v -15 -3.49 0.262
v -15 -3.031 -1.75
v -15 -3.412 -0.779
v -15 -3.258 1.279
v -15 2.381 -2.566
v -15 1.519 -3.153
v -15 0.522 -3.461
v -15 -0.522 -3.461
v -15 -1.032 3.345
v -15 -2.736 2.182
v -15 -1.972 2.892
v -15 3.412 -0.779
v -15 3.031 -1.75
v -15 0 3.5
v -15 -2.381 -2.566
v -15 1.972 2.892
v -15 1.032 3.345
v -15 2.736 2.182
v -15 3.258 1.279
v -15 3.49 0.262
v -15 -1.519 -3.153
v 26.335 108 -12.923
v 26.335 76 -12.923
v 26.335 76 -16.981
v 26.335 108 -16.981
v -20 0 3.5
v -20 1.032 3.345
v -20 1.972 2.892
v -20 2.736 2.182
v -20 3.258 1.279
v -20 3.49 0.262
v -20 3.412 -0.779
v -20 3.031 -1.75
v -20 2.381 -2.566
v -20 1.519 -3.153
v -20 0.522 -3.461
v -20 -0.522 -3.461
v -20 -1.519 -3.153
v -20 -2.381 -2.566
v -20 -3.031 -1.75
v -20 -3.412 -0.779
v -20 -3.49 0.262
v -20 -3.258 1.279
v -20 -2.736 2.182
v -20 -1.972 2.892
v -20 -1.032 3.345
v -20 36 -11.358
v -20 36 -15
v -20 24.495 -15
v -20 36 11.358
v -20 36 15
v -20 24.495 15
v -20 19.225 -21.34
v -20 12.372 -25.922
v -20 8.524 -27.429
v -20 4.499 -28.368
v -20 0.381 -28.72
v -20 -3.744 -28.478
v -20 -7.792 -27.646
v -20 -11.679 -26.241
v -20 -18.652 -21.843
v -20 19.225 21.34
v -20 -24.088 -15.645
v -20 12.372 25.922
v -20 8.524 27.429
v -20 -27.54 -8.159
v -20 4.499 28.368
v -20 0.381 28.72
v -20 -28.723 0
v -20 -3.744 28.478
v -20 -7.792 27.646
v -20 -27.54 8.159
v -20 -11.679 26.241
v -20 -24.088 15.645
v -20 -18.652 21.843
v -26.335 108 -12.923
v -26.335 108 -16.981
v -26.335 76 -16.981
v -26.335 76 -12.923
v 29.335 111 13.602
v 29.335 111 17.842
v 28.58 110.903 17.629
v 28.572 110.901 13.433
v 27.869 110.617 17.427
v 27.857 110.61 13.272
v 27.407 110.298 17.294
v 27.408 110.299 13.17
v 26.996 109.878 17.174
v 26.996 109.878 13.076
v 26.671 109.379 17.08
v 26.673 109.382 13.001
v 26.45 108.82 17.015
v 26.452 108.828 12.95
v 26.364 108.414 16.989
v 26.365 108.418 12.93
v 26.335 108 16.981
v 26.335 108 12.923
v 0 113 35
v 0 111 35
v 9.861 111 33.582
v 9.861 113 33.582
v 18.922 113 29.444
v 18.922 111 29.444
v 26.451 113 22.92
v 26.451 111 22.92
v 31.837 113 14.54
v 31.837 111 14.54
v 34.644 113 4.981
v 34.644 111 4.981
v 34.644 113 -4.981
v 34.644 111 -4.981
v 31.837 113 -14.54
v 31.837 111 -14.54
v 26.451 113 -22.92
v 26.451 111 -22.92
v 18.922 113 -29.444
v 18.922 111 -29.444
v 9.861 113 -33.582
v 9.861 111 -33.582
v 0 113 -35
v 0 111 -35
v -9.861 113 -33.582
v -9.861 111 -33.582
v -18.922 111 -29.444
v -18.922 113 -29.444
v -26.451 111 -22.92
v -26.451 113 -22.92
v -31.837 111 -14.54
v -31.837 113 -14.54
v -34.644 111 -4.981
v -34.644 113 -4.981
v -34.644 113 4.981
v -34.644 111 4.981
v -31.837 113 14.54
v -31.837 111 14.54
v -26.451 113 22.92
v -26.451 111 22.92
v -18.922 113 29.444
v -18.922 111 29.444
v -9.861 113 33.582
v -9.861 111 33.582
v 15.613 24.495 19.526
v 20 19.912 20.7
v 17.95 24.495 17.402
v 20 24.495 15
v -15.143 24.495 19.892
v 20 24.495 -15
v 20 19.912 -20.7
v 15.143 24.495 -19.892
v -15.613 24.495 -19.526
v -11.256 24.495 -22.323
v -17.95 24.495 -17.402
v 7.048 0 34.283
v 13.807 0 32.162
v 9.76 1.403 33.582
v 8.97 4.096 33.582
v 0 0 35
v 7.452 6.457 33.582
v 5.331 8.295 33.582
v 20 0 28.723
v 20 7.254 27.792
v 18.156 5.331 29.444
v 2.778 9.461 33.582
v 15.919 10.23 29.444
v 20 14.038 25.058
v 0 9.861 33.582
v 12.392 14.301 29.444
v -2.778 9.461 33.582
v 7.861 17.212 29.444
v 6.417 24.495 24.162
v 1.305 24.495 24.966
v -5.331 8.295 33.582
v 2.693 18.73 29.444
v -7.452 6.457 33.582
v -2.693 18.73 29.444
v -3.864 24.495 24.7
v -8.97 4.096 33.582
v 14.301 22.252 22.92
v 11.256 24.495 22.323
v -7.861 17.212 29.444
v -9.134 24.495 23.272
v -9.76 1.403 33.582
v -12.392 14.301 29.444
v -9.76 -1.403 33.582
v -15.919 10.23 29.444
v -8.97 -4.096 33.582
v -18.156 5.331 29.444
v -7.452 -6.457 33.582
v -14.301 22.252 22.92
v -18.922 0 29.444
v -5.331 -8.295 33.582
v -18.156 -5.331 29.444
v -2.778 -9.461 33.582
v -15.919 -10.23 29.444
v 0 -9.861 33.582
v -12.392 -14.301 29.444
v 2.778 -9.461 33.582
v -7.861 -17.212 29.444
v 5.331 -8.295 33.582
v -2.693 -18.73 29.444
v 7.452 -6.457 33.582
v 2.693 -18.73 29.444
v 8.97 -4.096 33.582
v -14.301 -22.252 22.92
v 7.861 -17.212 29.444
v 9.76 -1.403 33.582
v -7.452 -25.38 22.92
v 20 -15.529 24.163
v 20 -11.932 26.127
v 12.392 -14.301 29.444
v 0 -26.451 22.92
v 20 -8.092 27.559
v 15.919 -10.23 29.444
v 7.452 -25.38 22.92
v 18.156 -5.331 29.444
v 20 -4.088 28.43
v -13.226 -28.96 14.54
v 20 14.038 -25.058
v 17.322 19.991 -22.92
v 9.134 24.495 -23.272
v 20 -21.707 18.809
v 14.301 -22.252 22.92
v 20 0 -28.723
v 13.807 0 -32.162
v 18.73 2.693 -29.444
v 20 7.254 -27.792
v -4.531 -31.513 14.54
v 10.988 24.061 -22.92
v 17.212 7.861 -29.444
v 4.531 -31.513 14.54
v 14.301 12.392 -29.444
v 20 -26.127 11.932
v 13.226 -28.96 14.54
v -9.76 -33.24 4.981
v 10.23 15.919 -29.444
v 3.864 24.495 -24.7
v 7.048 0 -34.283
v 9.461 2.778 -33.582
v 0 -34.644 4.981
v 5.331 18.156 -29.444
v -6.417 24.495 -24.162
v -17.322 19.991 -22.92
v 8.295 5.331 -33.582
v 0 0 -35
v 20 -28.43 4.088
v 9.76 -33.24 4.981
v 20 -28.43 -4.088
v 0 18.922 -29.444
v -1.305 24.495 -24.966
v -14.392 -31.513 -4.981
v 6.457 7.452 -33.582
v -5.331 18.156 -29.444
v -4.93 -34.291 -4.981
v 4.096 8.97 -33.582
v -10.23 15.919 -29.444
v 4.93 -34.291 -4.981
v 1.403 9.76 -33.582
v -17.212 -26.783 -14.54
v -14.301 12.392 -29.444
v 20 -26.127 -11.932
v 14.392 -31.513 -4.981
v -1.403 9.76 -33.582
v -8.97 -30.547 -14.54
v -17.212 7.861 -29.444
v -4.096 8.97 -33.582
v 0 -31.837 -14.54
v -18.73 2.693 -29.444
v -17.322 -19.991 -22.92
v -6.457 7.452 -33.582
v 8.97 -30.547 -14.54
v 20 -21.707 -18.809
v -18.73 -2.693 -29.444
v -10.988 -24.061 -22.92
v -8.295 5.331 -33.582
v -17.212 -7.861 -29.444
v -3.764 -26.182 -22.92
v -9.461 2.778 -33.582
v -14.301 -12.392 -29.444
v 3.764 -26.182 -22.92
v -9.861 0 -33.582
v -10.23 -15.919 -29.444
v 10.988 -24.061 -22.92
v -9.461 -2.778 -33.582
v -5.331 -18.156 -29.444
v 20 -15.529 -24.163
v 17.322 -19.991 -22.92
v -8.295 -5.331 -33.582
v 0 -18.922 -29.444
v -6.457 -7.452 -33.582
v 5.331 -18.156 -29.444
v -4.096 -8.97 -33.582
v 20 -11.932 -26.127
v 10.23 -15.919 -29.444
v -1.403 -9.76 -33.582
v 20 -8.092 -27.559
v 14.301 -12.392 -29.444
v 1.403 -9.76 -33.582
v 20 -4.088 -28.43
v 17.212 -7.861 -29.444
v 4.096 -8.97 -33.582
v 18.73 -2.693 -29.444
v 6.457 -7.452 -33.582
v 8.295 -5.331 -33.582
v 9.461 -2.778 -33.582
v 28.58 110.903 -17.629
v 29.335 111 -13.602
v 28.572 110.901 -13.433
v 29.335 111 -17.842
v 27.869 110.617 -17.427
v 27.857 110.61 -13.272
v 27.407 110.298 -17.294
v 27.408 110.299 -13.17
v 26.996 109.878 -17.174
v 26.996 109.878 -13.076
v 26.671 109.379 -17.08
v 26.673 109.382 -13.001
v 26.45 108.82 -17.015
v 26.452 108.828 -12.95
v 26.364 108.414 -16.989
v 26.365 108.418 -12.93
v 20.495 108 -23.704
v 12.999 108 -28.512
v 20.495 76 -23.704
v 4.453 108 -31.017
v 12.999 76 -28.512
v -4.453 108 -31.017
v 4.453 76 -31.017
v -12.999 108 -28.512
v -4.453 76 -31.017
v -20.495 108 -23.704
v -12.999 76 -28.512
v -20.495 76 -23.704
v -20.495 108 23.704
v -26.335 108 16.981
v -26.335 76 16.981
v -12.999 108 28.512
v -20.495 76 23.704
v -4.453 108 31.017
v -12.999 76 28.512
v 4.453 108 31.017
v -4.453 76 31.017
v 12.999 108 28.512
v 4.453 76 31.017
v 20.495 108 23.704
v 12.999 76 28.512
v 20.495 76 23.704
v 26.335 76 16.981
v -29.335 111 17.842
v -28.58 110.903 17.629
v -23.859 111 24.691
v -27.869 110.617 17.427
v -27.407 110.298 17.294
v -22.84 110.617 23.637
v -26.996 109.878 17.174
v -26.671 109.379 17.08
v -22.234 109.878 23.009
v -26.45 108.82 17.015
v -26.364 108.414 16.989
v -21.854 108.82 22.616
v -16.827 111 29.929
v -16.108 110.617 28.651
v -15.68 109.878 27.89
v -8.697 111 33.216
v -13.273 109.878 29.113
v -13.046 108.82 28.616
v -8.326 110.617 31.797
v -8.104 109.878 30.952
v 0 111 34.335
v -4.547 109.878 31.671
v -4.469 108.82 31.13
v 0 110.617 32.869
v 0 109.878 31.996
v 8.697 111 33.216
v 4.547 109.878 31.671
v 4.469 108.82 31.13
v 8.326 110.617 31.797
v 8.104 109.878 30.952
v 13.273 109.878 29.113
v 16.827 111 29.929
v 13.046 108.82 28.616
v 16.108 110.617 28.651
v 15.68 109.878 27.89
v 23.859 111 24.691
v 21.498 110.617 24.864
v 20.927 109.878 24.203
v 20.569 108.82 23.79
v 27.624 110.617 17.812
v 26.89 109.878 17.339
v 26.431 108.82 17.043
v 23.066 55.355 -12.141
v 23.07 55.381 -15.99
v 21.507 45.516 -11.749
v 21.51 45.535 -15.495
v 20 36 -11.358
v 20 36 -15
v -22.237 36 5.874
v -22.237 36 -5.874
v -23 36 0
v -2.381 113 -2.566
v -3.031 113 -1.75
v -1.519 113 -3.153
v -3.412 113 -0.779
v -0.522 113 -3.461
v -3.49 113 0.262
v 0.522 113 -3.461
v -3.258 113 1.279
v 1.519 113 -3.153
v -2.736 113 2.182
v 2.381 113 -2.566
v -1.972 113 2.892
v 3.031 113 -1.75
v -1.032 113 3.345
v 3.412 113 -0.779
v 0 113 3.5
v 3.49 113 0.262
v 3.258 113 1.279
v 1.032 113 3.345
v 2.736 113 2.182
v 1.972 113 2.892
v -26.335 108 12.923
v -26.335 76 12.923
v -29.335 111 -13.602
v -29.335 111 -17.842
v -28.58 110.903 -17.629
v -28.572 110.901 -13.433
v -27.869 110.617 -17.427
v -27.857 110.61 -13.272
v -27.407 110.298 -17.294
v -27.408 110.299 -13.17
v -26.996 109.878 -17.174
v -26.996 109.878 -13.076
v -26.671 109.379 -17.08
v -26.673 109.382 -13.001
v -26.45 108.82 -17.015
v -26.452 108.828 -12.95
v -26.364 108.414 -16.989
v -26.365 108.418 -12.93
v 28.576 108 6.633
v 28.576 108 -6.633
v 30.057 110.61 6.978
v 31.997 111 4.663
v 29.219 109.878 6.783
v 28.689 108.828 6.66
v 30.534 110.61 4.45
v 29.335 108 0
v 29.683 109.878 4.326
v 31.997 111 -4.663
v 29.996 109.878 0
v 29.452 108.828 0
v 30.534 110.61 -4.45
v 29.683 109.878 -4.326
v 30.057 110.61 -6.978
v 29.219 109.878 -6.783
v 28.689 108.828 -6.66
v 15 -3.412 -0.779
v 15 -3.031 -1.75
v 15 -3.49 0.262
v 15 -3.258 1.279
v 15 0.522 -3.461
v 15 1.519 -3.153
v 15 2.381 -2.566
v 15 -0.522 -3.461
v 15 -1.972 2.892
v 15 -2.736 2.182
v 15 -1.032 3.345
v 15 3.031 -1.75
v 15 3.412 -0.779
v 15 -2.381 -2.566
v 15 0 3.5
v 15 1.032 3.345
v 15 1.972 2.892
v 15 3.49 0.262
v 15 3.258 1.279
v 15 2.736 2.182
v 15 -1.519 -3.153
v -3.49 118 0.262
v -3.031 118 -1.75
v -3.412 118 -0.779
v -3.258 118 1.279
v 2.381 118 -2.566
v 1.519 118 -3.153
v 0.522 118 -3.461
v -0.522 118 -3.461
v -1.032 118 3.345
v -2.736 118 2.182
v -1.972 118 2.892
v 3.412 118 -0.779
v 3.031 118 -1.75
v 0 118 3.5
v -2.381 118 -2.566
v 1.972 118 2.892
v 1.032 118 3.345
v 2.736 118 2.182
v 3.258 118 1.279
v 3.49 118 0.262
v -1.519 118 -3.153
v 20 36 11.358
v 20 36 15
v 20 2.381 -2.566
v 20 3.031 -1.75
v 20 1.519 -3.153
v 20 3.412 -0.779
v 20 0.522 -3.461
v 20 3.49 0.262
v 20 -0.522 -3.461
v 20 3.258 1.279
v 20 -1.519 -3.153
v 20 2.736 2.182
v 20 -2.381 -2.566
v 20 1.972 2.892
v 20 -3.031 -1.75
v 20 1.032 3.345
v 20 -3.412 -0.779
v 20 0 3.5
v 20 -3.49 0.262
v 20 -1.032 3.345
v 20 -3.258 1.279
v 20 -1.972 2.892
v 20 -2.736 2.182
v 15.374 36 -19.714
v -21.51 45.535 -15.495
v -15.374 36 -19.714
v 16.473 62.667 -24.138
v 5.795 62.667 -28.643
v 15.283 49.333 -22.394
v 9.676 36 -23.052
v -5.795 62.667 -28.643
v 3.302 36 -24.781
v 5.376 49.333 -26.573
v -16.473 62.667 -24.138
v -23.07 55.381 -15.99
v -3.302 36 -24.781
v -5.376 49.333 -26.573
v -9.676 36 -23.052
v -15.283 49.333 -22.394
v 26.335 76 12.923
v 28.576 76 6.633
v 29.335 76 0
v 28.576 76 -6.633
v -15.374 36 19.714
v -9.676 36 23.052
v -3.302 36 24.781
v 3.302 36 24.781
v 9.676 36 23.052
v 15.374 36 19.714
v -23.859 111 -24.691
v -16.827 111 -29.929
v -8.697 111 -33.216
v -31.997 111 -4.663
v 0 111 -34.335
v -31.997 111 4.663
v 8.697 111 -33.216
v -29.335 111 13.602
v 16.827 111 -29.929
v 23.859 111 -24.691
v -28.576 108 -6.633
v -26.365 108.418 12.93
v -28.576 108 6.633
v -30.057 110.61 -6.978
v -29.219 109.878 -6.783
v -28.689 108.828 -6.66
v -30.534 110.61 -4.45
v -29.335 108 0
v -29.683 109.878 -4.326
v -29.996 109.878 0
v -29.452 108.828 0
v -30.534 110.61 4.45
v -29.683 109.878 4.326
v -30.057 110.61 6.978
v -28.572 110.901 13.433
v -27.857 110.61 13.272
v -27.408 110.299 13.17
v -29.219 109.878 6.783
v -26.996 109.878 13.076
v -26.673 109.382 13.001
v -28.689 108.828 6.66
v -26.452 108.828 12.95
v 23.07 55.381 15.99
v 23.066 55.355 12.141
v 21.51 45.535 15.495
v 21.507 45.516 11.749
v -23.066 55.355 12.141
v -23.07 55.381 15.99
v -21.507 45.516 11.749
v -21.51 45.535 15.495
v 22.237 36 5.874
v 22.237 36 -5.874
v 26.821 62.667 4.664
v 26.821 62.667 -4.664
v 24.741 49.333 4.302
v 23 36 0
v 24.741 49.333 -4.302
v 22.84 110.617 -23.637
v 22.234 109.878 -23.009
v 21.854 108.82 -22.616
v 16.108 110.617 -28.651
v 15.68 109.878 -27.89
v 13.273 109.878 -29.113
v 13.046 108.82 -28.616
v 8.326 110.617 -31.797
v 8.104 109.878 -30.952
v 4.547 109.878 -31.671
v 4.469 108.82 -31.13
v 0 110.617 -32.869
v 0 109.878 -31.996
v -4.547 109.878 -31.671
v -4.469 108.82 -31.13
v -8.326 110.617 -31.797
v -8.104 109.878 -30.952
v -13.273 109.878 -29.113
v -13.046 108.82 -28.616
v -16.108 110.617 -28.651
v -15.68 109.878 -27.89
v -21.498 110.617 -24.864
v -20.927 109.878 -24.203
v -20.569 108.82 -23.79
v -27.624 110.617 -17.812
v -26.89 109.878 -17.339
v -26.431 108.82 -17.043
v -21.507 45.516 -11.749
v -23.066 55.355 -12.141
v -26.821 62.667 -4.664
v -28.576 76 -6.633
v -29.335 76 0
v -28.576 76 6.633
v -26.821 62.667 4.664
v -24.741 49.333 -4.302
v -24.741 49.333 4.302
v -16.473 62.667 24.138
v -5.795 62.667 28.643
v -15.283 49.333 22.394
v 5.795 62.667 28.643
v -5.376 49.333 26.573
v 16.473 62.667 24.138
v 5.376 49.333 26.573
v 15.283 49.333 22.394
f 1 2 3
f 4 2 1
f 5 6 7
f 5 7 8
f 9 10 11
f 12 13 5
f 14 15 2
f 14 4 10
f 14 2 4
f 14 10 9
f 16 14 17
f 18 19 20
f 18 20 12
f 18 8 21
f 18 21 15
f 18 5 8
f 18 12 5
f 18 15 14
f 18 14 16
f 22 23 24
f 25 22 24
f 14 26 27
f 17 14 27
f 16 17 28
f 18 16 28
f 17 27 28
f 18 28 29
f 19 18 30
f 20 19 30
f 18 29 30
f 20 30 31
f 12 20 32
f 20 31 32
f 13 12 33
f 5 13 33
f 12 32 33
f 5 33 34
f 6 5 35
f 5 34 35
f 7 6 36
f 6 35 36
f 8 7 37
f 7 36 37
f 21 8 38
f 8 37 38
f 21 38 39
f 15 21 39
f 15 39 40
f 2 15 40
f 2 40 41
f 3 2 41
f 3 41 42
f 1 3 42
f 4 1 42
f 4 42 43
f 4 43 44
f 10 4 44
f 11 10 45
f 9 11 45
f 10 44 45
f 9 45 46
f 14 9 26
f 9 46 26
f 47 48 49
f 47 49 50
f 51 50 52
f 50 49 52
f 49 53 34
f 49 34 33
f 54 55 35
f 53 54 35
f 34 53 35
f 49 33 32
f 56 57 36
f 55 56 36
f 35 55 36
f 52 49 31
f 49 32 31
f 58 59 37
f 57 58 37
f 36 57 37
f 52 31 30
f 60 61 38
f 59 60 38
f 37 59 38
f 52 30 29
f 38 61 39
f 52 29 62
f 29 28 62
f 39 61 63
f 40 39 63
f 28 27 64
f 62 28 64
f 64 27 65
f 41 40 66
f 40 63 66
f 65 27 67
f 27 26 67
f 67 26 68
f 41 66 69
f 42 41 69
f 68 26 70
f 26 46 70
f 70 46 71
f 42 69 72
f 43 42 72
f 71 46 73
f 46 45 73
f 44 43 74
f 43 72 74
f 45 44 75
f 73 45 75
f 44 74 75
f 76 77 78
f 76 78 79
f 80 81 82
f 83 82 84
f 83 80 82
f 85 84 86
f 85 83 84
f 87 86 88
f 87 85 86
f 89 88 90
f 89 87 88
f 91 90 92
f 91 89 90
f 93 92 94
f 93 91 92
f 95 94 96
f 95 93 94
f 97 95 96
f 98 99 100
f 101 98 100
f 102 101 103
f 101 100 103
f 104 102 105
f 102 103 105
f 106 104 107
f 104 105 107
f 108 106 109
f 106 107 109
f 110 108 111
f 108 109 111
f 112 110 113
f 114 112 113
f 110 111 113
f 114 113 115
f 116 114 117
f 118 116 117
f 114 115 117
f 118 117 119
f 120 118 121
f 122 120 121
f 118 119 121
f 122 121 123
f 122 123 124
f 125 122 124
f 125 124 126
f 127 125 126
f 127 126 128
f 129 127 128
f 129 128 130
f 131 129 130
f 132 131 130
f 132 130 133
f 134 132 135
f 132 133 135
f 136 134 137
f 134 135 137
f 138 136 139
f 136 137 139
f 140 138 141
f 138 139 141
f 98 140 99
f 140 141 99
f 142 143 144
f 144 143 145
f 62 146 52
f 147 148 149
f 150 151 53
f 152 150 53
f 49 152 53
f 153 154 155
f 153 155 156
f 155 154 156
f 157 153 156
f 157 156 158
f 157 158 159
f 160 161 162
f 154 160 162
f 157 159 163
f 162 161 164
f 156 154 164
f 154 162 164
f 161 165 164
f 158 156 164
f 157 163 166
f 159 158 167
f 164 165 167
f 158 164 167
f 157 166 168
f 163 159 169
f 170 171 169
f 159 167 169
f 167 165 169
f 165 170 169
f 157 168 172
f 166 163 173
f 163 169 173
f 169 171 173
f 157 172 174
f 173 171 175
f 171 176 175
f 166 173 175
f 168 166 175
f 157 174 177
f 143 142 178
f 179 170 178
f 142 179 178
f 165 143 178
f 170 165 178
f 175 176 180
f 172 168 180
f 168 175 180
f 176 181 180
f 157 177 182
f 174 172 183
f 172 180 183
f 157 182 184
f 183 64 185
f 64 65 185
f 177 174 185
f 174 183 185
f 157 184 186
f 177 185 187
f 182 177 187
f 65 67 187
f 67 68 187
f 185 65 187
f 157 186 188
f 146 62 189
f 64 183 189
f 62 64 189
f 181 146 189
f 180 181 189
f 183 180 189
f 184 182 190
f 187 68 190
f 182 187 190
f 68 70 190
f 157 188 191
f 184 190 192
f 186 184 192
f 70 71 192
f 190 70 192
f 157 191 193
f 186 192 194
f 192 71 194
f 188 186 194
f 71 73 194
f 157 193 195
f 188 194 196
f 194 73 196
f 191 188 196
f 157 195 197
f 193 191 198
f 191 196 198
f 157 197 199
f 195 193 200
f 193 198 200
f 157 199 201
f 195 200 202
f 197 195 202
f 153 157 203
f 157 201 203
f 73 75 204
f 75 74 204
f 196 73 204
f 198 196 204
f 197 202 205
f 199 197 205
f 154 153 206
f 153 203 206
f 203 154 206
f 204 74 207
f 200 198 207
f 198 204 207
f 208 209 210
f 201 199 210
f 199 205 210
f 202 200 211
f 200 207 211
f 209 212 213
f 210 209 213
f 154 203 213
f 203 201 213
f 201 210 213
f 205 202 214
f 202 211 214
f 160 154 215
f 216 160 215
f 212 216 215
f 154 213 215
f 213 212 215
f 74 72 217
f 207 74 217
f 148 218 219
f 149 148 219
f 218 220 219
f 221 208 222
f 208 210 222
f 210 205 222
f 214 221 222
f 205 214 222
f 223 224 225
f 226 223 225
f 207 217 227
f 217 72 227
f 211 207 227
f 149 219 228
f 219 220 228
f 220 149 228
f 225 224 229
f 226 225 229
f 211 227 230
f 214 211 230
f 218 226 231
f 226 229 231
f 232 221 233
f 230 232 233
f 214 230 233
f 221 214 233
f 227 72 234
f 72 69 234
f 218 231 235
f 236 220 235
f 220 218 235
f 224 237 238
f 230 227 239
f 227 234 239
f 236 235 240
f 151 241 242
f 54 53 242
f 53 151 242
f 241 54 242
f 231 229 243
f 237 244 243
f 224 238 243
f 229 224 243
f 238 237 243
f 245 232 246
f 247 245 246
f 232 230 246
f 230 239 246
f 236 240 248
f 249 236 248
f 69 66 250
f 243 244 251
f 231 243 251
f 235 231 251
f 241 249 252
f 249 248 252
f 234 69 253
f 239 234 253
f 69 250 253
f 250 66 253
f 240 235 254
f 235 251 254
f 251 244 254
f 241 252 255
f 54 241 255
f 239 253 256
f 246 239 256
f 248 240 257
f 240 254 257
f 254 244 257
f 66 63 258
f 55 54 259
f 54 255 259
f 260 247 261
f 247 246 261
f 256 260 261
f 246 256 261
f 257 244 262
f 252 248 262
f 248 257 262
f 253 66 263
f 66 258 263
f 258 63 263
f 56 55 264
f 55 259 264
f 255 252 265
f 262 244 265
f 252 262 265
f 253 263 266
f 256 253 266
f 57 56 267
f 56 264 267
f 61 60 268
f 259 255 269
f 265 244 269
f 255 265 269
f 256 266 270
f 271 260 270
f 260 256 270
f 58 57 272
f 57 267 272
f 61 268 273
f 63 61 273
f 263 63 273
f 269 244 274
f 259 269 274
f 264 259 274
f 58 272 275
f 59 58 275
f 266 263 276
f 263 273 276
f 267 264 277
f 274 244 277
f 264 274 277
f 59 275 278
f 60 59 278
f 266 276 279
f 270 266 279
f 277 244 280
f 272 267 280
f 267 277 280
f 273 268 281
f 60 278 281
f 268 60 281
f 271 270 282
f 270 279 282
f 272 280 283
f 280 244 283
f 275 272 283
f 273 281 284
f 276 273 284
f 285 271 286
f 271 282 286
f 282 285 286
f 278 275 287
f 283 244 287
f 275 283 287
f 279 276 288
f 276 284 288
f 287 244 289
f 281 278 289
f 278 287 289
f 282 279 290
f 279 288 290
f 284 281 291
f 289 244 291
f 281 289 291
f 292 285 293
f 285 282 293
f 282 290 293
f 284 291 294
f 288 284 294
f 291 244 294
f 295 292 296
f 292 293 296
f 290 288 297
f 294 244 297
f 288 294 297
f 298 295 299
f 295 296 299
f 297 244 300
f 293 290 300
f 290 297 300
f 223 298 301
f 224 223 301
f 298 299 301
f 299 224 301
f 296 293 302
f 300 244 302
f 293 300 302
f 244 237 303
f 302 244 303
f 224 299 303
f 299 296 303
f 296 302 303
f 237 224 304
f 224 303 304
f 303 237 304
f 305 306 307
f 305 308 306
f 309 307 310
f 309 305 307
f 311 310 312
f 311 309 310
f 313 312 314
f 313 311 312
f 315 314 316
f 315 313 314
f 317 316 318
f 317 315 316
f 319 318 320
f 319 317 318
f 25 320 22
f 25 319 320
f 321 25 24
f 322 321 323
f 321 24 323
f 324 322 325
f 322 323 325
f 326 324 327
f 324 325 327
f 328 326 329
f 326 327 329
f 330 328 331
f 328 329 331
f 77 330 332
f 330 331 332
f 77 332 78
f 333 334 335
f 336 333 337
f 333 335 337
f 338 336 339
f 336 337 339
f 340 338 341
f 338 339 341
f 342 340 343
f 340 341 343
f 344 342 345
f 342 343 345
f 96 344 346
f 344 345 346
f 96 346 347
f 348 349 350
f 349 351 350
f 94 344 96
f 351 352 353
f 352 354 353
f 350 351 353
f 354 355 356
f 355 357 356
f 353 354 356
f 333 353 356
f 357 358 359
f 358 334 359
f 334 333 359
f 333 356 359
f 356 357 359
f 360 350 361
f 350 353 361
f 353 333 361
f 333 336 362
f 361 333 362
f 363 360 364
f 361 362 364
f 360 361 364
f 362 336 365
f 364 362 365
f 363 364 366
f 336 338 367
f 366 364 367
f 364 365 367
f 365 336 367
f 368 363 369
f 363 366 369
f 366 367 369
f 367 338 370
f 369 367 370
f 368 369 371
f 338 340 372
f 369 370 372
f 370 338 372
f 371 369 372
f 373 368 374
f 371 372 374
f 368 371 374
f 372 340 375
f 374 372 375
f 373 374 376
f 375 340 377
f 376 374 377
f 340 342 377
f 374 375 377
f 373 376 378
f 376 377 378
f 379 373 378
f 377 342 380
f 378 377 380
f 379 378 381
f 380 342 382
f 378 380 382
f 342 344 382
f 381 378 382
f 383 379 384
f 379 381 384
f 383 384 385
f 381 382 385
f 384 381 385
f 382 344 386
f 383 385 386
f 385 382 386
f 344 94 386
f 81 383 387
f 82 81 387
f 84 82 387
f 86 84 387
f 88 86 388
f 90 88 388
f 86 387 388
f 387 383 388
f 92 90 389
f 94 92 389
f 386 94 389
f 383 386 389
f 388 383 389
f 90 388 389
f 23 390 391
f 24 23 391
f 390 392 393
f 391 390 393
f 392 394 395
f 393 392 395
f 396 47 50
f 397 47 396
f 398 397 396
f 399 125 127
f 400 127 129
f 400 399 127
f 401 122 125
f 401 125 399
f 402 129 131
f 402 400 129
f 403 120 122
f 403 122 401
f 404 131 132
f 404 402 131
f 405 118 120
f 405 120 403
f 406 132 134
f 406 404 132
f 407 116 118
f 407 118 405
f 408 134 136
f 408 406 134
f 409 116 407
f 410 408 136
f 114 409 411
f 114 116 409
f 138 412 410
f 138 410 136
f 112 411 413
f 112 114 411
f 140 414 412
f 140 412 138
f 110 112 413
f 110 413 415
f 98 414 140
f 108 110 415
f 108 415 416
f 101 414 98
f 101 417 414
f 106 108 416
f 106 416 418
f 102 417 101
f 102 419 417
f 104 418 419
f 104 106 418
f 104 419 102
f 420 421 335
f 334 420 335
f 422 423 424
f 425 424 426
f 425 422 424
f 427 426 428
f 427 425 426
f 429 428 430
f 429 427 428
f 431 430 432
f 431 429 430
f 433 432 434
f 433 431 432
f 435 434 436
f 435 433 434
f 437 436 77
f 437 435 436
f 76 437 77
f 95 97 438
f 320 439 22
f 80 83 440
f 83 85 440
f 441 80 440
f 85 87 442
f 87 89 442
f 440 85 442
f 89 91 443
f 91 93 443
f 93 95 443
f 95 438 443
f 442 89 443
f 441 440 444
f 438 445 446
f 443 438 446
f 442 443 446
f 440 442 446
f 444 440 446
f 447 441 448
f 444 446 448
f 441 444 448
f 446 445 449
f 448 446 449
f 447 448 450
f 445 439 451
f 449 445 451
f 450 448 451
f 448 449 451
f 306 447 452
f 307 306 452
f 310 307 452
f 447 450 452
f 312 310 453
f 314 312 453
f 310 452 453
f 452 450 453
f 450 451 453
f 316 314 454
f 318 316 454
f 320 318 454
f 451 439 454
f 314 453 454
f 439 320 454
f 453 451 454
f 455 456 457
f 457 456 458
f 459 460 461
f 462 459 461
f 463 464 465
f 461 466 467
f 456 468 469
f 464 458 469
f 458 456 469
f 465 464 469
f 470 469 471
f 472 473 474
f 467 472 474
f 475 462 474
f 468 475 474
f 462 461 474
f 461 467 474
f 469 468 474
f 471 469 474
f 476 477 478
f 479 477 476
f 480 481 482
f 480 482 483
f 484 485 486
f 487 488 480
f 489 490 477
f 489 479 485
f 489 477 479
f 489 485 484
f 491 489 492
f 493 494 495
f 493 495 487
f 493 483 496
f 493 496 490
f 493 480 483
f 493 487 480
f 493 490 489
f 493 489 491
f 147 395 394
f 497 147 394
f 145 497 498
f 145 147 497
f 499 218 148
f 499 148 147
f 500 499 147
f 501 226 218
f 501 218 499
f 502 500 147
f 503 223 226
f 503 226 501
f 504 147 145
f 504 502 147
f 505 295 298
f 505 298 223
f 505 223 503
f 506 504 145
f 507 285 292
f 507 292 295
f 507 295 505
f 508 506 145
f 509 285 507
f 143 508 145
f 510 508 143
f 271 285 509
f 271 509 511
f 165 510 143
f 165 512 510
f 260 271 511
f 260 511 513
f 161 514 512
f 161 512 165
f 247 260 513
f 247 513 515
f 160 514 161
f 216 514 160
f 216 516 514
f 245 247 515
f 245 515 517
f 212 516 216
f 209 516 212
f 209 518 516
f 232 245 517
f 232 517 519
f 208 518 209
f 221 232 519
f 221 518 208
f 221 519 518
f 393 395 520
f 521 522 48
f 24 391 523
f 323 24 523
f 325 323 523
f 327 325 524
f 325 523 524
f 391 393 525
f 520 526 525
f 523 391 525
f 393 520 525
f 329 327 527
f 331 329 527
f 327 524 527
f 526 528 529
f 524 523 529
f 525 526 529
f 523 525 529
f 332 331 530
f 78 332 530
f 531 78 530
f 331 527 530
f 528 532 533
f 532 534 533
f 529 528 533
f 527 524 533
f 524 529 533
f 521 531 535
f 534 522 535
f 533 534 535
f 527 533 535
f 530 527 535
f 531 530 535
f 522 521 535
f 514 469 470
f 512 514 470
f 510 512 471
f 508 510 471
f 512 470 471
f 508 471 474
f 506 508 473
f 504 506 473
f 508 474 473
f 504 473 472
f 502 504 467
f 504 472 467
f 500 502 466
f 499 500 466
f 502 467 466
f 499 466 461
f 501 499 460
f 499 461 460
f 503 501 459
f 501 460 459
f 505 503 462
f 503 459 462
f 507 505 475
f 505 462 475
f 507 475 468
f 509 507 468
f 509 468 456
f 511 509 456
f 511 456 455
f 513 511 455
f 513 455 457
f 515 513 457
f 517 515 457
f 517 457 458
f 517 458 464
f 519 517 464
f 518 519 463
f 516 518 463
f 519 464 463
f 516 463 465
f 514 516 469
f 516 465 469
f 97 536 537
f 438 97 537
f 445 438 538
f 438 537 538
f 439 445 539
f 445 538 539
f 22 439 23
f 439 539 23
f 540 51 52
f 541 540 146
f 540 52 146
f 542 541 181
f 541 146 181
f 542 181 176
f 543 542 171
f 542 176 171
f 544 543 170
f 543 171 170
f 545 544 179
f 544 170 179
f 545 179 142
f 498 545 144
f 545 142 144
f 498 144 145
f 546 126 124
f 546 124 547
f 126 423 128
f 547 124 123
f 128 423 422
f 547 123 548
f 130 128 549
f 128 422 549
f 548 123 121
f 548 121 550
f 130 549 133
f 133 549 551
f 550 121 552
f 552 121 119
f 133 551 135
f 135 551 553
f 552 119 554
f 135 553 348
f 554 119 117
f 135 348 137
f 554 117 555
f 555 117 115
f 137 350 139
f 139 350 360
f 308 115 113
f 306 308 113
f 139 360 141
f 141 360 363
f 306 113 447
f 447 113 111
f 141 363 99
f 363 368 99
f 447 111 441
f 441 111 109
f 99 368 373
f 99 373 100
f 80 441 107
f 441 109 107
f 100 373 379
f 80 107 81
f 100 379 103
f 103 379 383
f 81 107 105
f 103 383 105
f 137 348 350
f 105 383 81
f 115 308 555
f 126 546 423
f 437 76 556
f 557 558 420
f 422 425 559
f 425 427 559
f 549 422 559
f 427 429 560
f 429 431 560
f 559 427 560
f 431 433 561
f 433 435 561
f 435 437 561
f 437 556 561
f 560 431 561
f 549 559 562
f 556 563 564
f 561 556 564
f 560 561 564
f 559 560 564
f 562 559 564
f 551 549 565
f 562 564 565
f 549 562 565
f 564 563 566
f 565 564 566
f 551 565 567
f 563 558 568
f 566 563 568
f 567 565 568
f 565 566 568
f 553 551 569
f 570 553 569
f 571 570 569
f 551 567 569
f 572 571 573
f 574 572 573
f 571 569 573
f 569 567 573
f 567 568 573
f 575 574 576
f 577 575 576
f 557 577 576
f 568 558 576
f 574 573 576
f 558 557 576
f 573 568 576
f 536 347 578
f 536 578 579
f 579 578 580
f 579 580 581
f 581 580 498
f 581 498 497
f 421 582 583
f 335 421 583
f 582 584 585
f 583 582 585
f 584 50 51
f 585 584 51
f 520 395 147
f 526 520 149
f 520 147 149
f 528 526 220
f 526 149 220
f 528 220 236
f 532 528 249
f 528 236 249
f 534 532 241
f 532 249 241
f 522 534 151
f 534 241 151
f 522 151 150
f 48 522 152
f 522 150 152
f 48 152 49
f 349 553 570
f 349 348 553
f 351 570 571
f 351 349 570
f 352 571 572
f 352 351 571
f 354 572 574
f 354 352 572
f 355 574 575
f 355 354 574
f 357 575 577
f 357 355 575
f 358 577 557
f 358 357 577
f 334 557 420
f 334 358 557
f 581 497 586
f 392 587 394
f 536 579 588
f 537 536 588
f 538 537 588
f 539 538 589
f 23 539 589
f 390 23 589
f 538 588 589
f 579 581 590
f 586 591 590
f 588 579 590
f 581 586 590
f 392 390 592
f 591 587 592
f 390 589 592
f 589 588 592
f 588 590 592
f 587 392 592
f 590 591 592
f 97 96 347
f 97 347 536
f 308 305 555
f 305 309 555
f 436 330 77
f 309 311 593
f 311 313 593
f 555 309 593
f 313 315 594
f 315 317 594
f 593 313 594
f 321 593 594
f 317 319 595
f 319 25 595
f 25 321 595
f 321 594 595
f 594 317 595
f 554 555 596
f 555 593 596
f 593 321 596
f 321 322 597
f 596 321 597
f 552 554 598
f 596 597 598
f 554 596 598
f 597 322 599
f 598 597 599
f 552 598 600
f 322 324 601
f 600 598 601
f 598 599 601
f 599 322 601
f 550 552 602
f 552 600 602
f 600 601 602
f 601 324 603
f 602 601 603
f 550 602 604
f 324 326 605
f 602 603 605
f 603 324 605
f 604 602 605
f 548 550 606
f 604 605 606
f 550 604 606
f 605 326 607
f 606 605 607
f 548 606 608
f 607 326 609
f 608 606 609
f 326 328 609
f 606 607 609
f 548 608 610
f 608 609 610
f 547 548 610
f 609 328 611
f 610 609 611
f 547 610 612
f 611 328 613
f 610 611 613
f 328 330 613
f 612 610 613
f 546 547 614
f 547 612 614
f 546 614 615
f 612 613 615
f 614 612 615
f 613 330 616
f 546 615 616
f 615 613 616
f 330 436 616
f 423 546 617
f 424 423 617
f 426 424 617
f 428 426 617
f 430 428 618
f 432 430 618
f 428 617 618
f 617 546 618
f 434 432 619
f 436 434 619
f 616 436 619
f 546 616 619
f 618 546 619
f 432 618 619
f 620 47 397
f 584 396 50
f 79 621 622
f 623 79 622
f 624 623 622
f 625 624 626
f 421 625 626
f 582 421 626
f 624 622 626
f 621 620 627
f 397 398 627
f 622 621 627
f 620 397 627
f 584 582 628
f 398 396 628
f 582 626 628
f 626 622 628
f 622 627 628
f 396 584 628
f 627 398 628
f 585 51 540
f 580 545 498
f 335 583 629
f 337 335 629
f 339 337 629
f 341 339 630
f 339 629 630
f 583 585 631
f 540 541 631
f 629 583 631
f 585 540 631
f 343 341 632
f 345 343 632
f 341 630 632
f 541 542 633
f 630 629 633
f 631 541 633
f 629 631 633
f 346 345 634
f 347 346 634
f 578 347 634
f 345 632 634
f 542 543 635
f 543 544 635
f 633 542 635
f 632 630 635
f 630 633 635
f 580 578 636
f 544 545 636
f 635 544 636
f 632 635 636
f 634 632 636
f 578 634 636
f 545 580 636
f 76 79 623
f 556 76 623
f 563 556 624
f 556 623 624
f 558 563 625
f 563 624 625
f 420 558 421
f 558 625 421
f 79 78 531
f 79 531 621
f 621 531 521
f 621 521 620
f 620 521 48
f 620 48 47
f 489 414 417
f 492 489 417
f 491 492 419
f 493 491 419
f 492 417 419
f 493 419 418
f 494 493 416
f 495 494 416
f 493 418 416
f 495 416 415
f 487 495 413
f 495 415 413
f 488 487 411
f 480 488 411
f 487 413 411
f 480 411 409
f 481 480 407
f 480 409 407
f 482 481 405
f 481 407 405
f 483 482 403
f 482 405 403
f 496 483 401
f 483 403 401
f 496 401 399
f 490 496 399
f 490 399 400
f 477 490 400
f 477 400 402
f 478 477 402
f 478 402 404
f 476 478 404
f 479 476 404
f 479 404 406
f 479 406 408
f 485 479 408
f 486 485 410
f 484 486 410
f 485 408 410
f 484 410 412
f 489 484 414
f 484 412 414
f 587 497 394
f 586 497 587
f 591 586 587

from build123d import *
from build123d.topology import SkipClean

# Parameters (mm, degrees)
CUT_EXTRUDE1_DEPTH      = 35
CUT_EXTRUDE1_DEPTH_BACK = 35
SKETCH2_OUTSIDE_W       = 96.248
SKETCH2_OUTSIDE_H       = 96.248
BOSS_EXTRUDE1_DEPTH     = 36
SKETCH4_R               = 3.5
CUT_EXTRUDE2_DEPTH      = 5
LPATTERN1_COUNT         = 2
LPATTERN1_PITCH         = 35
BOSS_EXTRUDE2_DEPTH     = 40
BOSS_EXTRUDE2_DRAFT     = -9
BOSS_EXTRUDE6_DEPTH     = 35
SKETCH10_R              = 35
BOSS_EXTRUDE7_DEPTH     = 2
FILLET5_R               = 3
SKETCH11_R              = 3.5
BOSS_EXTRUDE8_DEPTH     = 5


with BuildPart() as part:
    # Sketch1 → Revolve2 (revolve)
    with BuildSketch(Plane(origin=(0, 0, 0), x_dir=(1, 0, 0), z_dir=(0, 1, 0))):
        with BuildLine():
            Line((0, 35), (0, -35))
            ThreePointArc((0, -35), (35, 0), (0, 35))
        make_face()
    revolve(axis=Axis((0, 0, -35), (0, 0, 1)))

    # Sketch2 outside → Cut-Extrude1 (cut, two sides: drawn at the far end of the back side and taken through both)
    with SkipClean():  # the faces are left unmerged after this step: merging them gives an invalid solid
        with BuildSketch(Plane(origin=(0, 0, 0), x_dir=(1, 0, 0), z_dir=(0, 1, 0)).offset(-CUT_EXTRUDE1_DEPTH_BACK)):
            Rectangle(SKETCH2_OUTSIDE_W, SKETCH2_OUTSIDE_H)
            with BuildLine():
                Line((-20, -28.722813233), (-20, 28.722813233))
                ThreePointArc((-20, 28.722813233), (0, 35), (20, 28.722813233))
                Line((20, 28.722813233), (20, -28.722813233))
                ThreePointArc((20, -28.722813233), (0, -35), (-20, -28.722813233))
            make_face(mode=Mode.SUBTRACT)
        extrude(amount=CUT_EXTRUDE1_DEPTH + CUT_EXTRUDE1_DEPTH_BACK, mode=Mode.SUBTRACT)

    # Sketch3 → Boss-Extrude1 (add)
    with BuildSketch(Plane(origin=(0, 0, 0), x_dir=(1, 0, 0), z_dir=(0, 1, 0))):
        with BuildLine():
            Line((-20, 15), (-20, -15))
            ThreePointArc((-20, -15), (0, -25), (20, -15))
            Line((20, -15), (20, 15))
            ThreePointArc((20, 15), (0, 25), (-20, 15))
        make_face()
    extrude(amount=BOSS_EXTRUDE1_DEPTH)

    # Sketch4 → Cut-Extrude2 (cut)
    with BuildSketch(Plane.ZY.offset(20)):
        Circle(SKETCH4_R)
    cut_extrude2 = extrude(amount=-CUT_EXTRUDE2_DEPTH, mode=Mode.SUBTRACT)

    # LPattern1: Cut-Extrude2 ×2
    with Locations(*[(i * LPATTERN1_PITCH, 0, 0) for i in range(1, LPATTERN1_COUNT)]):
        add(cut_extrude2, mode=Mode.SUBTRACT)


with BuildPart() as boss_extrude2_tool:
    # Sketch5 → Boss-Extrude2 (with draft: the straight prism first)
    with BuildSketch(Plane(origin=(0, 36, 0), x_dir=(1, 0, 0), z_dir=(0, 1, 0))):
        with BuildLine():
            Line((-20, 15), (-20, 11.357816692))
            ThreePointArc((-20, 11.357816692), (-23, 0), (-20, -11.357816692))
            Line((-20, -11.357816692), (-20, -15))
            ThreePointArc((-20, -15), (0, -25), (20, -15))
            Line((20, -15), (20, -11.357816692))
            ThreePointArc((20, -11.357816692), (23, 0), (20, 11.357816692))
            Line((20, 11.357816692), (20, 15))
            ThreePointArc((20, 15), (0, 25), (-20, 15))
        make_face()
    extrude(amount=BOSS_EXTRUDE2_DEPTH)
    # Boss-Extrude2: the draft: its side faces are tilted about the plane it starts from
    boss_extrude2_sides = [boss_extrude2_tool.faces().sort_by_distance(p)[0] for p in [
        (20, 56, -13.178908346),
        (0, 56, -25),
        (-20, 56, -13.178908346),
        (-23, 56, 0),
        (-20, 56, 13.178908346),
        (0, 56, 25),
        (20, 56, 13.178908346),
        (23, 56, 0),
    ]]
    draft(boss_extrude2_sides, Plane(origin=(0, 36, 0), x_dir=(1, 0, 0), z_dir=(0, 1, 0)), BOSS_EXTRUDE2_DRAFT)


with BuildPart() as part_1:
    add(part.part)

    # Boss-Extrude2: add boss_extrude2_tool
    add(boss_extrude2_tool.part)

    # Sketch9 → Boss-Extrude6 (add)
    with BuildSketch(Plane(origin=(0, 76, 0), x_dir=(1, 0, 0), z_dir=(0, 1, 0))):
        with BuildLine():
            Line((26.335377613, 12.923322548), (26.335377613, 16.980982779))
            ThreePointArc((26.335377613, 16.980982779), (0, 31.335377613), (-26.335377613, 16.980982779))
            Line((-26.335377613, 16.980982779), (-26.335377613, 12.923322548))
            ThreePointArc((-26.335377613, 12.923322548), (-29.335377613, 0), (-26.335377613, -12.923322548))
            Line((-26.335377613, -12.923322548), (-26.335377613, -16.980982779))
            ThreePointArc((-26.335377613, -16.980982779), (0, -31.335377613), (26.335377613, -16.980982779))
            Line((26.335377613, -16.980982779), (26.335377613, -12.923322548))
            ThreePointArc((26.335377613, -12.923322548), (29.335377613, 0), (26.335377613, 12.923322548))
        make_face()
    extrude(amount=BOSS_EXTRUDE6_DEPTH)

    # Sketch10 → Boss-Extrude7 (add)
    with BuildSketch(Plane(origin=(0, 111, 0), x_dir=(1, 0, 0), z_dir=(0, 1, 0))):
        with Locations(Location((0, 0, 0), (0, 0, 270))):
            Circle(SKETCH10_R)
    extrude(amount=BOSS_EXTRUDE7_DEPTH)

    # Fillet5
    fillet5_edges = [part_1.edges().sort_by_distance(p)[0] for p in [
        (29.335377613, 111, 0),
        (26.335377613, 111, -14.952152663),
        (0, 111, -31.335377613),
        (-26.335377613, 111, -14.952152663),
        (-29.335377613, 111, 0),
        (-26.335377613, 111, 14.952152663),
        (0, 111, 31.335377613),
        (26.335377613, 111, 14.952152663),
    ]]
    fillet(fillet5_edges, radius=FILLET5_R)

    # Sketch11 → Boss-Extrude8 (add)
    with BuildSketch(Plane(origin=(0, 113, 0), x_dir=(1, 0, 0), z_dir=(0, 1, 0))):
        with Locations(Location((0, 0, 0), (0, 0, 270))):
            Circle(SKETCH11_R)
    extrude(amount=BOSS_EXTRUDE8_DEPTH)


solid = part_1.part
